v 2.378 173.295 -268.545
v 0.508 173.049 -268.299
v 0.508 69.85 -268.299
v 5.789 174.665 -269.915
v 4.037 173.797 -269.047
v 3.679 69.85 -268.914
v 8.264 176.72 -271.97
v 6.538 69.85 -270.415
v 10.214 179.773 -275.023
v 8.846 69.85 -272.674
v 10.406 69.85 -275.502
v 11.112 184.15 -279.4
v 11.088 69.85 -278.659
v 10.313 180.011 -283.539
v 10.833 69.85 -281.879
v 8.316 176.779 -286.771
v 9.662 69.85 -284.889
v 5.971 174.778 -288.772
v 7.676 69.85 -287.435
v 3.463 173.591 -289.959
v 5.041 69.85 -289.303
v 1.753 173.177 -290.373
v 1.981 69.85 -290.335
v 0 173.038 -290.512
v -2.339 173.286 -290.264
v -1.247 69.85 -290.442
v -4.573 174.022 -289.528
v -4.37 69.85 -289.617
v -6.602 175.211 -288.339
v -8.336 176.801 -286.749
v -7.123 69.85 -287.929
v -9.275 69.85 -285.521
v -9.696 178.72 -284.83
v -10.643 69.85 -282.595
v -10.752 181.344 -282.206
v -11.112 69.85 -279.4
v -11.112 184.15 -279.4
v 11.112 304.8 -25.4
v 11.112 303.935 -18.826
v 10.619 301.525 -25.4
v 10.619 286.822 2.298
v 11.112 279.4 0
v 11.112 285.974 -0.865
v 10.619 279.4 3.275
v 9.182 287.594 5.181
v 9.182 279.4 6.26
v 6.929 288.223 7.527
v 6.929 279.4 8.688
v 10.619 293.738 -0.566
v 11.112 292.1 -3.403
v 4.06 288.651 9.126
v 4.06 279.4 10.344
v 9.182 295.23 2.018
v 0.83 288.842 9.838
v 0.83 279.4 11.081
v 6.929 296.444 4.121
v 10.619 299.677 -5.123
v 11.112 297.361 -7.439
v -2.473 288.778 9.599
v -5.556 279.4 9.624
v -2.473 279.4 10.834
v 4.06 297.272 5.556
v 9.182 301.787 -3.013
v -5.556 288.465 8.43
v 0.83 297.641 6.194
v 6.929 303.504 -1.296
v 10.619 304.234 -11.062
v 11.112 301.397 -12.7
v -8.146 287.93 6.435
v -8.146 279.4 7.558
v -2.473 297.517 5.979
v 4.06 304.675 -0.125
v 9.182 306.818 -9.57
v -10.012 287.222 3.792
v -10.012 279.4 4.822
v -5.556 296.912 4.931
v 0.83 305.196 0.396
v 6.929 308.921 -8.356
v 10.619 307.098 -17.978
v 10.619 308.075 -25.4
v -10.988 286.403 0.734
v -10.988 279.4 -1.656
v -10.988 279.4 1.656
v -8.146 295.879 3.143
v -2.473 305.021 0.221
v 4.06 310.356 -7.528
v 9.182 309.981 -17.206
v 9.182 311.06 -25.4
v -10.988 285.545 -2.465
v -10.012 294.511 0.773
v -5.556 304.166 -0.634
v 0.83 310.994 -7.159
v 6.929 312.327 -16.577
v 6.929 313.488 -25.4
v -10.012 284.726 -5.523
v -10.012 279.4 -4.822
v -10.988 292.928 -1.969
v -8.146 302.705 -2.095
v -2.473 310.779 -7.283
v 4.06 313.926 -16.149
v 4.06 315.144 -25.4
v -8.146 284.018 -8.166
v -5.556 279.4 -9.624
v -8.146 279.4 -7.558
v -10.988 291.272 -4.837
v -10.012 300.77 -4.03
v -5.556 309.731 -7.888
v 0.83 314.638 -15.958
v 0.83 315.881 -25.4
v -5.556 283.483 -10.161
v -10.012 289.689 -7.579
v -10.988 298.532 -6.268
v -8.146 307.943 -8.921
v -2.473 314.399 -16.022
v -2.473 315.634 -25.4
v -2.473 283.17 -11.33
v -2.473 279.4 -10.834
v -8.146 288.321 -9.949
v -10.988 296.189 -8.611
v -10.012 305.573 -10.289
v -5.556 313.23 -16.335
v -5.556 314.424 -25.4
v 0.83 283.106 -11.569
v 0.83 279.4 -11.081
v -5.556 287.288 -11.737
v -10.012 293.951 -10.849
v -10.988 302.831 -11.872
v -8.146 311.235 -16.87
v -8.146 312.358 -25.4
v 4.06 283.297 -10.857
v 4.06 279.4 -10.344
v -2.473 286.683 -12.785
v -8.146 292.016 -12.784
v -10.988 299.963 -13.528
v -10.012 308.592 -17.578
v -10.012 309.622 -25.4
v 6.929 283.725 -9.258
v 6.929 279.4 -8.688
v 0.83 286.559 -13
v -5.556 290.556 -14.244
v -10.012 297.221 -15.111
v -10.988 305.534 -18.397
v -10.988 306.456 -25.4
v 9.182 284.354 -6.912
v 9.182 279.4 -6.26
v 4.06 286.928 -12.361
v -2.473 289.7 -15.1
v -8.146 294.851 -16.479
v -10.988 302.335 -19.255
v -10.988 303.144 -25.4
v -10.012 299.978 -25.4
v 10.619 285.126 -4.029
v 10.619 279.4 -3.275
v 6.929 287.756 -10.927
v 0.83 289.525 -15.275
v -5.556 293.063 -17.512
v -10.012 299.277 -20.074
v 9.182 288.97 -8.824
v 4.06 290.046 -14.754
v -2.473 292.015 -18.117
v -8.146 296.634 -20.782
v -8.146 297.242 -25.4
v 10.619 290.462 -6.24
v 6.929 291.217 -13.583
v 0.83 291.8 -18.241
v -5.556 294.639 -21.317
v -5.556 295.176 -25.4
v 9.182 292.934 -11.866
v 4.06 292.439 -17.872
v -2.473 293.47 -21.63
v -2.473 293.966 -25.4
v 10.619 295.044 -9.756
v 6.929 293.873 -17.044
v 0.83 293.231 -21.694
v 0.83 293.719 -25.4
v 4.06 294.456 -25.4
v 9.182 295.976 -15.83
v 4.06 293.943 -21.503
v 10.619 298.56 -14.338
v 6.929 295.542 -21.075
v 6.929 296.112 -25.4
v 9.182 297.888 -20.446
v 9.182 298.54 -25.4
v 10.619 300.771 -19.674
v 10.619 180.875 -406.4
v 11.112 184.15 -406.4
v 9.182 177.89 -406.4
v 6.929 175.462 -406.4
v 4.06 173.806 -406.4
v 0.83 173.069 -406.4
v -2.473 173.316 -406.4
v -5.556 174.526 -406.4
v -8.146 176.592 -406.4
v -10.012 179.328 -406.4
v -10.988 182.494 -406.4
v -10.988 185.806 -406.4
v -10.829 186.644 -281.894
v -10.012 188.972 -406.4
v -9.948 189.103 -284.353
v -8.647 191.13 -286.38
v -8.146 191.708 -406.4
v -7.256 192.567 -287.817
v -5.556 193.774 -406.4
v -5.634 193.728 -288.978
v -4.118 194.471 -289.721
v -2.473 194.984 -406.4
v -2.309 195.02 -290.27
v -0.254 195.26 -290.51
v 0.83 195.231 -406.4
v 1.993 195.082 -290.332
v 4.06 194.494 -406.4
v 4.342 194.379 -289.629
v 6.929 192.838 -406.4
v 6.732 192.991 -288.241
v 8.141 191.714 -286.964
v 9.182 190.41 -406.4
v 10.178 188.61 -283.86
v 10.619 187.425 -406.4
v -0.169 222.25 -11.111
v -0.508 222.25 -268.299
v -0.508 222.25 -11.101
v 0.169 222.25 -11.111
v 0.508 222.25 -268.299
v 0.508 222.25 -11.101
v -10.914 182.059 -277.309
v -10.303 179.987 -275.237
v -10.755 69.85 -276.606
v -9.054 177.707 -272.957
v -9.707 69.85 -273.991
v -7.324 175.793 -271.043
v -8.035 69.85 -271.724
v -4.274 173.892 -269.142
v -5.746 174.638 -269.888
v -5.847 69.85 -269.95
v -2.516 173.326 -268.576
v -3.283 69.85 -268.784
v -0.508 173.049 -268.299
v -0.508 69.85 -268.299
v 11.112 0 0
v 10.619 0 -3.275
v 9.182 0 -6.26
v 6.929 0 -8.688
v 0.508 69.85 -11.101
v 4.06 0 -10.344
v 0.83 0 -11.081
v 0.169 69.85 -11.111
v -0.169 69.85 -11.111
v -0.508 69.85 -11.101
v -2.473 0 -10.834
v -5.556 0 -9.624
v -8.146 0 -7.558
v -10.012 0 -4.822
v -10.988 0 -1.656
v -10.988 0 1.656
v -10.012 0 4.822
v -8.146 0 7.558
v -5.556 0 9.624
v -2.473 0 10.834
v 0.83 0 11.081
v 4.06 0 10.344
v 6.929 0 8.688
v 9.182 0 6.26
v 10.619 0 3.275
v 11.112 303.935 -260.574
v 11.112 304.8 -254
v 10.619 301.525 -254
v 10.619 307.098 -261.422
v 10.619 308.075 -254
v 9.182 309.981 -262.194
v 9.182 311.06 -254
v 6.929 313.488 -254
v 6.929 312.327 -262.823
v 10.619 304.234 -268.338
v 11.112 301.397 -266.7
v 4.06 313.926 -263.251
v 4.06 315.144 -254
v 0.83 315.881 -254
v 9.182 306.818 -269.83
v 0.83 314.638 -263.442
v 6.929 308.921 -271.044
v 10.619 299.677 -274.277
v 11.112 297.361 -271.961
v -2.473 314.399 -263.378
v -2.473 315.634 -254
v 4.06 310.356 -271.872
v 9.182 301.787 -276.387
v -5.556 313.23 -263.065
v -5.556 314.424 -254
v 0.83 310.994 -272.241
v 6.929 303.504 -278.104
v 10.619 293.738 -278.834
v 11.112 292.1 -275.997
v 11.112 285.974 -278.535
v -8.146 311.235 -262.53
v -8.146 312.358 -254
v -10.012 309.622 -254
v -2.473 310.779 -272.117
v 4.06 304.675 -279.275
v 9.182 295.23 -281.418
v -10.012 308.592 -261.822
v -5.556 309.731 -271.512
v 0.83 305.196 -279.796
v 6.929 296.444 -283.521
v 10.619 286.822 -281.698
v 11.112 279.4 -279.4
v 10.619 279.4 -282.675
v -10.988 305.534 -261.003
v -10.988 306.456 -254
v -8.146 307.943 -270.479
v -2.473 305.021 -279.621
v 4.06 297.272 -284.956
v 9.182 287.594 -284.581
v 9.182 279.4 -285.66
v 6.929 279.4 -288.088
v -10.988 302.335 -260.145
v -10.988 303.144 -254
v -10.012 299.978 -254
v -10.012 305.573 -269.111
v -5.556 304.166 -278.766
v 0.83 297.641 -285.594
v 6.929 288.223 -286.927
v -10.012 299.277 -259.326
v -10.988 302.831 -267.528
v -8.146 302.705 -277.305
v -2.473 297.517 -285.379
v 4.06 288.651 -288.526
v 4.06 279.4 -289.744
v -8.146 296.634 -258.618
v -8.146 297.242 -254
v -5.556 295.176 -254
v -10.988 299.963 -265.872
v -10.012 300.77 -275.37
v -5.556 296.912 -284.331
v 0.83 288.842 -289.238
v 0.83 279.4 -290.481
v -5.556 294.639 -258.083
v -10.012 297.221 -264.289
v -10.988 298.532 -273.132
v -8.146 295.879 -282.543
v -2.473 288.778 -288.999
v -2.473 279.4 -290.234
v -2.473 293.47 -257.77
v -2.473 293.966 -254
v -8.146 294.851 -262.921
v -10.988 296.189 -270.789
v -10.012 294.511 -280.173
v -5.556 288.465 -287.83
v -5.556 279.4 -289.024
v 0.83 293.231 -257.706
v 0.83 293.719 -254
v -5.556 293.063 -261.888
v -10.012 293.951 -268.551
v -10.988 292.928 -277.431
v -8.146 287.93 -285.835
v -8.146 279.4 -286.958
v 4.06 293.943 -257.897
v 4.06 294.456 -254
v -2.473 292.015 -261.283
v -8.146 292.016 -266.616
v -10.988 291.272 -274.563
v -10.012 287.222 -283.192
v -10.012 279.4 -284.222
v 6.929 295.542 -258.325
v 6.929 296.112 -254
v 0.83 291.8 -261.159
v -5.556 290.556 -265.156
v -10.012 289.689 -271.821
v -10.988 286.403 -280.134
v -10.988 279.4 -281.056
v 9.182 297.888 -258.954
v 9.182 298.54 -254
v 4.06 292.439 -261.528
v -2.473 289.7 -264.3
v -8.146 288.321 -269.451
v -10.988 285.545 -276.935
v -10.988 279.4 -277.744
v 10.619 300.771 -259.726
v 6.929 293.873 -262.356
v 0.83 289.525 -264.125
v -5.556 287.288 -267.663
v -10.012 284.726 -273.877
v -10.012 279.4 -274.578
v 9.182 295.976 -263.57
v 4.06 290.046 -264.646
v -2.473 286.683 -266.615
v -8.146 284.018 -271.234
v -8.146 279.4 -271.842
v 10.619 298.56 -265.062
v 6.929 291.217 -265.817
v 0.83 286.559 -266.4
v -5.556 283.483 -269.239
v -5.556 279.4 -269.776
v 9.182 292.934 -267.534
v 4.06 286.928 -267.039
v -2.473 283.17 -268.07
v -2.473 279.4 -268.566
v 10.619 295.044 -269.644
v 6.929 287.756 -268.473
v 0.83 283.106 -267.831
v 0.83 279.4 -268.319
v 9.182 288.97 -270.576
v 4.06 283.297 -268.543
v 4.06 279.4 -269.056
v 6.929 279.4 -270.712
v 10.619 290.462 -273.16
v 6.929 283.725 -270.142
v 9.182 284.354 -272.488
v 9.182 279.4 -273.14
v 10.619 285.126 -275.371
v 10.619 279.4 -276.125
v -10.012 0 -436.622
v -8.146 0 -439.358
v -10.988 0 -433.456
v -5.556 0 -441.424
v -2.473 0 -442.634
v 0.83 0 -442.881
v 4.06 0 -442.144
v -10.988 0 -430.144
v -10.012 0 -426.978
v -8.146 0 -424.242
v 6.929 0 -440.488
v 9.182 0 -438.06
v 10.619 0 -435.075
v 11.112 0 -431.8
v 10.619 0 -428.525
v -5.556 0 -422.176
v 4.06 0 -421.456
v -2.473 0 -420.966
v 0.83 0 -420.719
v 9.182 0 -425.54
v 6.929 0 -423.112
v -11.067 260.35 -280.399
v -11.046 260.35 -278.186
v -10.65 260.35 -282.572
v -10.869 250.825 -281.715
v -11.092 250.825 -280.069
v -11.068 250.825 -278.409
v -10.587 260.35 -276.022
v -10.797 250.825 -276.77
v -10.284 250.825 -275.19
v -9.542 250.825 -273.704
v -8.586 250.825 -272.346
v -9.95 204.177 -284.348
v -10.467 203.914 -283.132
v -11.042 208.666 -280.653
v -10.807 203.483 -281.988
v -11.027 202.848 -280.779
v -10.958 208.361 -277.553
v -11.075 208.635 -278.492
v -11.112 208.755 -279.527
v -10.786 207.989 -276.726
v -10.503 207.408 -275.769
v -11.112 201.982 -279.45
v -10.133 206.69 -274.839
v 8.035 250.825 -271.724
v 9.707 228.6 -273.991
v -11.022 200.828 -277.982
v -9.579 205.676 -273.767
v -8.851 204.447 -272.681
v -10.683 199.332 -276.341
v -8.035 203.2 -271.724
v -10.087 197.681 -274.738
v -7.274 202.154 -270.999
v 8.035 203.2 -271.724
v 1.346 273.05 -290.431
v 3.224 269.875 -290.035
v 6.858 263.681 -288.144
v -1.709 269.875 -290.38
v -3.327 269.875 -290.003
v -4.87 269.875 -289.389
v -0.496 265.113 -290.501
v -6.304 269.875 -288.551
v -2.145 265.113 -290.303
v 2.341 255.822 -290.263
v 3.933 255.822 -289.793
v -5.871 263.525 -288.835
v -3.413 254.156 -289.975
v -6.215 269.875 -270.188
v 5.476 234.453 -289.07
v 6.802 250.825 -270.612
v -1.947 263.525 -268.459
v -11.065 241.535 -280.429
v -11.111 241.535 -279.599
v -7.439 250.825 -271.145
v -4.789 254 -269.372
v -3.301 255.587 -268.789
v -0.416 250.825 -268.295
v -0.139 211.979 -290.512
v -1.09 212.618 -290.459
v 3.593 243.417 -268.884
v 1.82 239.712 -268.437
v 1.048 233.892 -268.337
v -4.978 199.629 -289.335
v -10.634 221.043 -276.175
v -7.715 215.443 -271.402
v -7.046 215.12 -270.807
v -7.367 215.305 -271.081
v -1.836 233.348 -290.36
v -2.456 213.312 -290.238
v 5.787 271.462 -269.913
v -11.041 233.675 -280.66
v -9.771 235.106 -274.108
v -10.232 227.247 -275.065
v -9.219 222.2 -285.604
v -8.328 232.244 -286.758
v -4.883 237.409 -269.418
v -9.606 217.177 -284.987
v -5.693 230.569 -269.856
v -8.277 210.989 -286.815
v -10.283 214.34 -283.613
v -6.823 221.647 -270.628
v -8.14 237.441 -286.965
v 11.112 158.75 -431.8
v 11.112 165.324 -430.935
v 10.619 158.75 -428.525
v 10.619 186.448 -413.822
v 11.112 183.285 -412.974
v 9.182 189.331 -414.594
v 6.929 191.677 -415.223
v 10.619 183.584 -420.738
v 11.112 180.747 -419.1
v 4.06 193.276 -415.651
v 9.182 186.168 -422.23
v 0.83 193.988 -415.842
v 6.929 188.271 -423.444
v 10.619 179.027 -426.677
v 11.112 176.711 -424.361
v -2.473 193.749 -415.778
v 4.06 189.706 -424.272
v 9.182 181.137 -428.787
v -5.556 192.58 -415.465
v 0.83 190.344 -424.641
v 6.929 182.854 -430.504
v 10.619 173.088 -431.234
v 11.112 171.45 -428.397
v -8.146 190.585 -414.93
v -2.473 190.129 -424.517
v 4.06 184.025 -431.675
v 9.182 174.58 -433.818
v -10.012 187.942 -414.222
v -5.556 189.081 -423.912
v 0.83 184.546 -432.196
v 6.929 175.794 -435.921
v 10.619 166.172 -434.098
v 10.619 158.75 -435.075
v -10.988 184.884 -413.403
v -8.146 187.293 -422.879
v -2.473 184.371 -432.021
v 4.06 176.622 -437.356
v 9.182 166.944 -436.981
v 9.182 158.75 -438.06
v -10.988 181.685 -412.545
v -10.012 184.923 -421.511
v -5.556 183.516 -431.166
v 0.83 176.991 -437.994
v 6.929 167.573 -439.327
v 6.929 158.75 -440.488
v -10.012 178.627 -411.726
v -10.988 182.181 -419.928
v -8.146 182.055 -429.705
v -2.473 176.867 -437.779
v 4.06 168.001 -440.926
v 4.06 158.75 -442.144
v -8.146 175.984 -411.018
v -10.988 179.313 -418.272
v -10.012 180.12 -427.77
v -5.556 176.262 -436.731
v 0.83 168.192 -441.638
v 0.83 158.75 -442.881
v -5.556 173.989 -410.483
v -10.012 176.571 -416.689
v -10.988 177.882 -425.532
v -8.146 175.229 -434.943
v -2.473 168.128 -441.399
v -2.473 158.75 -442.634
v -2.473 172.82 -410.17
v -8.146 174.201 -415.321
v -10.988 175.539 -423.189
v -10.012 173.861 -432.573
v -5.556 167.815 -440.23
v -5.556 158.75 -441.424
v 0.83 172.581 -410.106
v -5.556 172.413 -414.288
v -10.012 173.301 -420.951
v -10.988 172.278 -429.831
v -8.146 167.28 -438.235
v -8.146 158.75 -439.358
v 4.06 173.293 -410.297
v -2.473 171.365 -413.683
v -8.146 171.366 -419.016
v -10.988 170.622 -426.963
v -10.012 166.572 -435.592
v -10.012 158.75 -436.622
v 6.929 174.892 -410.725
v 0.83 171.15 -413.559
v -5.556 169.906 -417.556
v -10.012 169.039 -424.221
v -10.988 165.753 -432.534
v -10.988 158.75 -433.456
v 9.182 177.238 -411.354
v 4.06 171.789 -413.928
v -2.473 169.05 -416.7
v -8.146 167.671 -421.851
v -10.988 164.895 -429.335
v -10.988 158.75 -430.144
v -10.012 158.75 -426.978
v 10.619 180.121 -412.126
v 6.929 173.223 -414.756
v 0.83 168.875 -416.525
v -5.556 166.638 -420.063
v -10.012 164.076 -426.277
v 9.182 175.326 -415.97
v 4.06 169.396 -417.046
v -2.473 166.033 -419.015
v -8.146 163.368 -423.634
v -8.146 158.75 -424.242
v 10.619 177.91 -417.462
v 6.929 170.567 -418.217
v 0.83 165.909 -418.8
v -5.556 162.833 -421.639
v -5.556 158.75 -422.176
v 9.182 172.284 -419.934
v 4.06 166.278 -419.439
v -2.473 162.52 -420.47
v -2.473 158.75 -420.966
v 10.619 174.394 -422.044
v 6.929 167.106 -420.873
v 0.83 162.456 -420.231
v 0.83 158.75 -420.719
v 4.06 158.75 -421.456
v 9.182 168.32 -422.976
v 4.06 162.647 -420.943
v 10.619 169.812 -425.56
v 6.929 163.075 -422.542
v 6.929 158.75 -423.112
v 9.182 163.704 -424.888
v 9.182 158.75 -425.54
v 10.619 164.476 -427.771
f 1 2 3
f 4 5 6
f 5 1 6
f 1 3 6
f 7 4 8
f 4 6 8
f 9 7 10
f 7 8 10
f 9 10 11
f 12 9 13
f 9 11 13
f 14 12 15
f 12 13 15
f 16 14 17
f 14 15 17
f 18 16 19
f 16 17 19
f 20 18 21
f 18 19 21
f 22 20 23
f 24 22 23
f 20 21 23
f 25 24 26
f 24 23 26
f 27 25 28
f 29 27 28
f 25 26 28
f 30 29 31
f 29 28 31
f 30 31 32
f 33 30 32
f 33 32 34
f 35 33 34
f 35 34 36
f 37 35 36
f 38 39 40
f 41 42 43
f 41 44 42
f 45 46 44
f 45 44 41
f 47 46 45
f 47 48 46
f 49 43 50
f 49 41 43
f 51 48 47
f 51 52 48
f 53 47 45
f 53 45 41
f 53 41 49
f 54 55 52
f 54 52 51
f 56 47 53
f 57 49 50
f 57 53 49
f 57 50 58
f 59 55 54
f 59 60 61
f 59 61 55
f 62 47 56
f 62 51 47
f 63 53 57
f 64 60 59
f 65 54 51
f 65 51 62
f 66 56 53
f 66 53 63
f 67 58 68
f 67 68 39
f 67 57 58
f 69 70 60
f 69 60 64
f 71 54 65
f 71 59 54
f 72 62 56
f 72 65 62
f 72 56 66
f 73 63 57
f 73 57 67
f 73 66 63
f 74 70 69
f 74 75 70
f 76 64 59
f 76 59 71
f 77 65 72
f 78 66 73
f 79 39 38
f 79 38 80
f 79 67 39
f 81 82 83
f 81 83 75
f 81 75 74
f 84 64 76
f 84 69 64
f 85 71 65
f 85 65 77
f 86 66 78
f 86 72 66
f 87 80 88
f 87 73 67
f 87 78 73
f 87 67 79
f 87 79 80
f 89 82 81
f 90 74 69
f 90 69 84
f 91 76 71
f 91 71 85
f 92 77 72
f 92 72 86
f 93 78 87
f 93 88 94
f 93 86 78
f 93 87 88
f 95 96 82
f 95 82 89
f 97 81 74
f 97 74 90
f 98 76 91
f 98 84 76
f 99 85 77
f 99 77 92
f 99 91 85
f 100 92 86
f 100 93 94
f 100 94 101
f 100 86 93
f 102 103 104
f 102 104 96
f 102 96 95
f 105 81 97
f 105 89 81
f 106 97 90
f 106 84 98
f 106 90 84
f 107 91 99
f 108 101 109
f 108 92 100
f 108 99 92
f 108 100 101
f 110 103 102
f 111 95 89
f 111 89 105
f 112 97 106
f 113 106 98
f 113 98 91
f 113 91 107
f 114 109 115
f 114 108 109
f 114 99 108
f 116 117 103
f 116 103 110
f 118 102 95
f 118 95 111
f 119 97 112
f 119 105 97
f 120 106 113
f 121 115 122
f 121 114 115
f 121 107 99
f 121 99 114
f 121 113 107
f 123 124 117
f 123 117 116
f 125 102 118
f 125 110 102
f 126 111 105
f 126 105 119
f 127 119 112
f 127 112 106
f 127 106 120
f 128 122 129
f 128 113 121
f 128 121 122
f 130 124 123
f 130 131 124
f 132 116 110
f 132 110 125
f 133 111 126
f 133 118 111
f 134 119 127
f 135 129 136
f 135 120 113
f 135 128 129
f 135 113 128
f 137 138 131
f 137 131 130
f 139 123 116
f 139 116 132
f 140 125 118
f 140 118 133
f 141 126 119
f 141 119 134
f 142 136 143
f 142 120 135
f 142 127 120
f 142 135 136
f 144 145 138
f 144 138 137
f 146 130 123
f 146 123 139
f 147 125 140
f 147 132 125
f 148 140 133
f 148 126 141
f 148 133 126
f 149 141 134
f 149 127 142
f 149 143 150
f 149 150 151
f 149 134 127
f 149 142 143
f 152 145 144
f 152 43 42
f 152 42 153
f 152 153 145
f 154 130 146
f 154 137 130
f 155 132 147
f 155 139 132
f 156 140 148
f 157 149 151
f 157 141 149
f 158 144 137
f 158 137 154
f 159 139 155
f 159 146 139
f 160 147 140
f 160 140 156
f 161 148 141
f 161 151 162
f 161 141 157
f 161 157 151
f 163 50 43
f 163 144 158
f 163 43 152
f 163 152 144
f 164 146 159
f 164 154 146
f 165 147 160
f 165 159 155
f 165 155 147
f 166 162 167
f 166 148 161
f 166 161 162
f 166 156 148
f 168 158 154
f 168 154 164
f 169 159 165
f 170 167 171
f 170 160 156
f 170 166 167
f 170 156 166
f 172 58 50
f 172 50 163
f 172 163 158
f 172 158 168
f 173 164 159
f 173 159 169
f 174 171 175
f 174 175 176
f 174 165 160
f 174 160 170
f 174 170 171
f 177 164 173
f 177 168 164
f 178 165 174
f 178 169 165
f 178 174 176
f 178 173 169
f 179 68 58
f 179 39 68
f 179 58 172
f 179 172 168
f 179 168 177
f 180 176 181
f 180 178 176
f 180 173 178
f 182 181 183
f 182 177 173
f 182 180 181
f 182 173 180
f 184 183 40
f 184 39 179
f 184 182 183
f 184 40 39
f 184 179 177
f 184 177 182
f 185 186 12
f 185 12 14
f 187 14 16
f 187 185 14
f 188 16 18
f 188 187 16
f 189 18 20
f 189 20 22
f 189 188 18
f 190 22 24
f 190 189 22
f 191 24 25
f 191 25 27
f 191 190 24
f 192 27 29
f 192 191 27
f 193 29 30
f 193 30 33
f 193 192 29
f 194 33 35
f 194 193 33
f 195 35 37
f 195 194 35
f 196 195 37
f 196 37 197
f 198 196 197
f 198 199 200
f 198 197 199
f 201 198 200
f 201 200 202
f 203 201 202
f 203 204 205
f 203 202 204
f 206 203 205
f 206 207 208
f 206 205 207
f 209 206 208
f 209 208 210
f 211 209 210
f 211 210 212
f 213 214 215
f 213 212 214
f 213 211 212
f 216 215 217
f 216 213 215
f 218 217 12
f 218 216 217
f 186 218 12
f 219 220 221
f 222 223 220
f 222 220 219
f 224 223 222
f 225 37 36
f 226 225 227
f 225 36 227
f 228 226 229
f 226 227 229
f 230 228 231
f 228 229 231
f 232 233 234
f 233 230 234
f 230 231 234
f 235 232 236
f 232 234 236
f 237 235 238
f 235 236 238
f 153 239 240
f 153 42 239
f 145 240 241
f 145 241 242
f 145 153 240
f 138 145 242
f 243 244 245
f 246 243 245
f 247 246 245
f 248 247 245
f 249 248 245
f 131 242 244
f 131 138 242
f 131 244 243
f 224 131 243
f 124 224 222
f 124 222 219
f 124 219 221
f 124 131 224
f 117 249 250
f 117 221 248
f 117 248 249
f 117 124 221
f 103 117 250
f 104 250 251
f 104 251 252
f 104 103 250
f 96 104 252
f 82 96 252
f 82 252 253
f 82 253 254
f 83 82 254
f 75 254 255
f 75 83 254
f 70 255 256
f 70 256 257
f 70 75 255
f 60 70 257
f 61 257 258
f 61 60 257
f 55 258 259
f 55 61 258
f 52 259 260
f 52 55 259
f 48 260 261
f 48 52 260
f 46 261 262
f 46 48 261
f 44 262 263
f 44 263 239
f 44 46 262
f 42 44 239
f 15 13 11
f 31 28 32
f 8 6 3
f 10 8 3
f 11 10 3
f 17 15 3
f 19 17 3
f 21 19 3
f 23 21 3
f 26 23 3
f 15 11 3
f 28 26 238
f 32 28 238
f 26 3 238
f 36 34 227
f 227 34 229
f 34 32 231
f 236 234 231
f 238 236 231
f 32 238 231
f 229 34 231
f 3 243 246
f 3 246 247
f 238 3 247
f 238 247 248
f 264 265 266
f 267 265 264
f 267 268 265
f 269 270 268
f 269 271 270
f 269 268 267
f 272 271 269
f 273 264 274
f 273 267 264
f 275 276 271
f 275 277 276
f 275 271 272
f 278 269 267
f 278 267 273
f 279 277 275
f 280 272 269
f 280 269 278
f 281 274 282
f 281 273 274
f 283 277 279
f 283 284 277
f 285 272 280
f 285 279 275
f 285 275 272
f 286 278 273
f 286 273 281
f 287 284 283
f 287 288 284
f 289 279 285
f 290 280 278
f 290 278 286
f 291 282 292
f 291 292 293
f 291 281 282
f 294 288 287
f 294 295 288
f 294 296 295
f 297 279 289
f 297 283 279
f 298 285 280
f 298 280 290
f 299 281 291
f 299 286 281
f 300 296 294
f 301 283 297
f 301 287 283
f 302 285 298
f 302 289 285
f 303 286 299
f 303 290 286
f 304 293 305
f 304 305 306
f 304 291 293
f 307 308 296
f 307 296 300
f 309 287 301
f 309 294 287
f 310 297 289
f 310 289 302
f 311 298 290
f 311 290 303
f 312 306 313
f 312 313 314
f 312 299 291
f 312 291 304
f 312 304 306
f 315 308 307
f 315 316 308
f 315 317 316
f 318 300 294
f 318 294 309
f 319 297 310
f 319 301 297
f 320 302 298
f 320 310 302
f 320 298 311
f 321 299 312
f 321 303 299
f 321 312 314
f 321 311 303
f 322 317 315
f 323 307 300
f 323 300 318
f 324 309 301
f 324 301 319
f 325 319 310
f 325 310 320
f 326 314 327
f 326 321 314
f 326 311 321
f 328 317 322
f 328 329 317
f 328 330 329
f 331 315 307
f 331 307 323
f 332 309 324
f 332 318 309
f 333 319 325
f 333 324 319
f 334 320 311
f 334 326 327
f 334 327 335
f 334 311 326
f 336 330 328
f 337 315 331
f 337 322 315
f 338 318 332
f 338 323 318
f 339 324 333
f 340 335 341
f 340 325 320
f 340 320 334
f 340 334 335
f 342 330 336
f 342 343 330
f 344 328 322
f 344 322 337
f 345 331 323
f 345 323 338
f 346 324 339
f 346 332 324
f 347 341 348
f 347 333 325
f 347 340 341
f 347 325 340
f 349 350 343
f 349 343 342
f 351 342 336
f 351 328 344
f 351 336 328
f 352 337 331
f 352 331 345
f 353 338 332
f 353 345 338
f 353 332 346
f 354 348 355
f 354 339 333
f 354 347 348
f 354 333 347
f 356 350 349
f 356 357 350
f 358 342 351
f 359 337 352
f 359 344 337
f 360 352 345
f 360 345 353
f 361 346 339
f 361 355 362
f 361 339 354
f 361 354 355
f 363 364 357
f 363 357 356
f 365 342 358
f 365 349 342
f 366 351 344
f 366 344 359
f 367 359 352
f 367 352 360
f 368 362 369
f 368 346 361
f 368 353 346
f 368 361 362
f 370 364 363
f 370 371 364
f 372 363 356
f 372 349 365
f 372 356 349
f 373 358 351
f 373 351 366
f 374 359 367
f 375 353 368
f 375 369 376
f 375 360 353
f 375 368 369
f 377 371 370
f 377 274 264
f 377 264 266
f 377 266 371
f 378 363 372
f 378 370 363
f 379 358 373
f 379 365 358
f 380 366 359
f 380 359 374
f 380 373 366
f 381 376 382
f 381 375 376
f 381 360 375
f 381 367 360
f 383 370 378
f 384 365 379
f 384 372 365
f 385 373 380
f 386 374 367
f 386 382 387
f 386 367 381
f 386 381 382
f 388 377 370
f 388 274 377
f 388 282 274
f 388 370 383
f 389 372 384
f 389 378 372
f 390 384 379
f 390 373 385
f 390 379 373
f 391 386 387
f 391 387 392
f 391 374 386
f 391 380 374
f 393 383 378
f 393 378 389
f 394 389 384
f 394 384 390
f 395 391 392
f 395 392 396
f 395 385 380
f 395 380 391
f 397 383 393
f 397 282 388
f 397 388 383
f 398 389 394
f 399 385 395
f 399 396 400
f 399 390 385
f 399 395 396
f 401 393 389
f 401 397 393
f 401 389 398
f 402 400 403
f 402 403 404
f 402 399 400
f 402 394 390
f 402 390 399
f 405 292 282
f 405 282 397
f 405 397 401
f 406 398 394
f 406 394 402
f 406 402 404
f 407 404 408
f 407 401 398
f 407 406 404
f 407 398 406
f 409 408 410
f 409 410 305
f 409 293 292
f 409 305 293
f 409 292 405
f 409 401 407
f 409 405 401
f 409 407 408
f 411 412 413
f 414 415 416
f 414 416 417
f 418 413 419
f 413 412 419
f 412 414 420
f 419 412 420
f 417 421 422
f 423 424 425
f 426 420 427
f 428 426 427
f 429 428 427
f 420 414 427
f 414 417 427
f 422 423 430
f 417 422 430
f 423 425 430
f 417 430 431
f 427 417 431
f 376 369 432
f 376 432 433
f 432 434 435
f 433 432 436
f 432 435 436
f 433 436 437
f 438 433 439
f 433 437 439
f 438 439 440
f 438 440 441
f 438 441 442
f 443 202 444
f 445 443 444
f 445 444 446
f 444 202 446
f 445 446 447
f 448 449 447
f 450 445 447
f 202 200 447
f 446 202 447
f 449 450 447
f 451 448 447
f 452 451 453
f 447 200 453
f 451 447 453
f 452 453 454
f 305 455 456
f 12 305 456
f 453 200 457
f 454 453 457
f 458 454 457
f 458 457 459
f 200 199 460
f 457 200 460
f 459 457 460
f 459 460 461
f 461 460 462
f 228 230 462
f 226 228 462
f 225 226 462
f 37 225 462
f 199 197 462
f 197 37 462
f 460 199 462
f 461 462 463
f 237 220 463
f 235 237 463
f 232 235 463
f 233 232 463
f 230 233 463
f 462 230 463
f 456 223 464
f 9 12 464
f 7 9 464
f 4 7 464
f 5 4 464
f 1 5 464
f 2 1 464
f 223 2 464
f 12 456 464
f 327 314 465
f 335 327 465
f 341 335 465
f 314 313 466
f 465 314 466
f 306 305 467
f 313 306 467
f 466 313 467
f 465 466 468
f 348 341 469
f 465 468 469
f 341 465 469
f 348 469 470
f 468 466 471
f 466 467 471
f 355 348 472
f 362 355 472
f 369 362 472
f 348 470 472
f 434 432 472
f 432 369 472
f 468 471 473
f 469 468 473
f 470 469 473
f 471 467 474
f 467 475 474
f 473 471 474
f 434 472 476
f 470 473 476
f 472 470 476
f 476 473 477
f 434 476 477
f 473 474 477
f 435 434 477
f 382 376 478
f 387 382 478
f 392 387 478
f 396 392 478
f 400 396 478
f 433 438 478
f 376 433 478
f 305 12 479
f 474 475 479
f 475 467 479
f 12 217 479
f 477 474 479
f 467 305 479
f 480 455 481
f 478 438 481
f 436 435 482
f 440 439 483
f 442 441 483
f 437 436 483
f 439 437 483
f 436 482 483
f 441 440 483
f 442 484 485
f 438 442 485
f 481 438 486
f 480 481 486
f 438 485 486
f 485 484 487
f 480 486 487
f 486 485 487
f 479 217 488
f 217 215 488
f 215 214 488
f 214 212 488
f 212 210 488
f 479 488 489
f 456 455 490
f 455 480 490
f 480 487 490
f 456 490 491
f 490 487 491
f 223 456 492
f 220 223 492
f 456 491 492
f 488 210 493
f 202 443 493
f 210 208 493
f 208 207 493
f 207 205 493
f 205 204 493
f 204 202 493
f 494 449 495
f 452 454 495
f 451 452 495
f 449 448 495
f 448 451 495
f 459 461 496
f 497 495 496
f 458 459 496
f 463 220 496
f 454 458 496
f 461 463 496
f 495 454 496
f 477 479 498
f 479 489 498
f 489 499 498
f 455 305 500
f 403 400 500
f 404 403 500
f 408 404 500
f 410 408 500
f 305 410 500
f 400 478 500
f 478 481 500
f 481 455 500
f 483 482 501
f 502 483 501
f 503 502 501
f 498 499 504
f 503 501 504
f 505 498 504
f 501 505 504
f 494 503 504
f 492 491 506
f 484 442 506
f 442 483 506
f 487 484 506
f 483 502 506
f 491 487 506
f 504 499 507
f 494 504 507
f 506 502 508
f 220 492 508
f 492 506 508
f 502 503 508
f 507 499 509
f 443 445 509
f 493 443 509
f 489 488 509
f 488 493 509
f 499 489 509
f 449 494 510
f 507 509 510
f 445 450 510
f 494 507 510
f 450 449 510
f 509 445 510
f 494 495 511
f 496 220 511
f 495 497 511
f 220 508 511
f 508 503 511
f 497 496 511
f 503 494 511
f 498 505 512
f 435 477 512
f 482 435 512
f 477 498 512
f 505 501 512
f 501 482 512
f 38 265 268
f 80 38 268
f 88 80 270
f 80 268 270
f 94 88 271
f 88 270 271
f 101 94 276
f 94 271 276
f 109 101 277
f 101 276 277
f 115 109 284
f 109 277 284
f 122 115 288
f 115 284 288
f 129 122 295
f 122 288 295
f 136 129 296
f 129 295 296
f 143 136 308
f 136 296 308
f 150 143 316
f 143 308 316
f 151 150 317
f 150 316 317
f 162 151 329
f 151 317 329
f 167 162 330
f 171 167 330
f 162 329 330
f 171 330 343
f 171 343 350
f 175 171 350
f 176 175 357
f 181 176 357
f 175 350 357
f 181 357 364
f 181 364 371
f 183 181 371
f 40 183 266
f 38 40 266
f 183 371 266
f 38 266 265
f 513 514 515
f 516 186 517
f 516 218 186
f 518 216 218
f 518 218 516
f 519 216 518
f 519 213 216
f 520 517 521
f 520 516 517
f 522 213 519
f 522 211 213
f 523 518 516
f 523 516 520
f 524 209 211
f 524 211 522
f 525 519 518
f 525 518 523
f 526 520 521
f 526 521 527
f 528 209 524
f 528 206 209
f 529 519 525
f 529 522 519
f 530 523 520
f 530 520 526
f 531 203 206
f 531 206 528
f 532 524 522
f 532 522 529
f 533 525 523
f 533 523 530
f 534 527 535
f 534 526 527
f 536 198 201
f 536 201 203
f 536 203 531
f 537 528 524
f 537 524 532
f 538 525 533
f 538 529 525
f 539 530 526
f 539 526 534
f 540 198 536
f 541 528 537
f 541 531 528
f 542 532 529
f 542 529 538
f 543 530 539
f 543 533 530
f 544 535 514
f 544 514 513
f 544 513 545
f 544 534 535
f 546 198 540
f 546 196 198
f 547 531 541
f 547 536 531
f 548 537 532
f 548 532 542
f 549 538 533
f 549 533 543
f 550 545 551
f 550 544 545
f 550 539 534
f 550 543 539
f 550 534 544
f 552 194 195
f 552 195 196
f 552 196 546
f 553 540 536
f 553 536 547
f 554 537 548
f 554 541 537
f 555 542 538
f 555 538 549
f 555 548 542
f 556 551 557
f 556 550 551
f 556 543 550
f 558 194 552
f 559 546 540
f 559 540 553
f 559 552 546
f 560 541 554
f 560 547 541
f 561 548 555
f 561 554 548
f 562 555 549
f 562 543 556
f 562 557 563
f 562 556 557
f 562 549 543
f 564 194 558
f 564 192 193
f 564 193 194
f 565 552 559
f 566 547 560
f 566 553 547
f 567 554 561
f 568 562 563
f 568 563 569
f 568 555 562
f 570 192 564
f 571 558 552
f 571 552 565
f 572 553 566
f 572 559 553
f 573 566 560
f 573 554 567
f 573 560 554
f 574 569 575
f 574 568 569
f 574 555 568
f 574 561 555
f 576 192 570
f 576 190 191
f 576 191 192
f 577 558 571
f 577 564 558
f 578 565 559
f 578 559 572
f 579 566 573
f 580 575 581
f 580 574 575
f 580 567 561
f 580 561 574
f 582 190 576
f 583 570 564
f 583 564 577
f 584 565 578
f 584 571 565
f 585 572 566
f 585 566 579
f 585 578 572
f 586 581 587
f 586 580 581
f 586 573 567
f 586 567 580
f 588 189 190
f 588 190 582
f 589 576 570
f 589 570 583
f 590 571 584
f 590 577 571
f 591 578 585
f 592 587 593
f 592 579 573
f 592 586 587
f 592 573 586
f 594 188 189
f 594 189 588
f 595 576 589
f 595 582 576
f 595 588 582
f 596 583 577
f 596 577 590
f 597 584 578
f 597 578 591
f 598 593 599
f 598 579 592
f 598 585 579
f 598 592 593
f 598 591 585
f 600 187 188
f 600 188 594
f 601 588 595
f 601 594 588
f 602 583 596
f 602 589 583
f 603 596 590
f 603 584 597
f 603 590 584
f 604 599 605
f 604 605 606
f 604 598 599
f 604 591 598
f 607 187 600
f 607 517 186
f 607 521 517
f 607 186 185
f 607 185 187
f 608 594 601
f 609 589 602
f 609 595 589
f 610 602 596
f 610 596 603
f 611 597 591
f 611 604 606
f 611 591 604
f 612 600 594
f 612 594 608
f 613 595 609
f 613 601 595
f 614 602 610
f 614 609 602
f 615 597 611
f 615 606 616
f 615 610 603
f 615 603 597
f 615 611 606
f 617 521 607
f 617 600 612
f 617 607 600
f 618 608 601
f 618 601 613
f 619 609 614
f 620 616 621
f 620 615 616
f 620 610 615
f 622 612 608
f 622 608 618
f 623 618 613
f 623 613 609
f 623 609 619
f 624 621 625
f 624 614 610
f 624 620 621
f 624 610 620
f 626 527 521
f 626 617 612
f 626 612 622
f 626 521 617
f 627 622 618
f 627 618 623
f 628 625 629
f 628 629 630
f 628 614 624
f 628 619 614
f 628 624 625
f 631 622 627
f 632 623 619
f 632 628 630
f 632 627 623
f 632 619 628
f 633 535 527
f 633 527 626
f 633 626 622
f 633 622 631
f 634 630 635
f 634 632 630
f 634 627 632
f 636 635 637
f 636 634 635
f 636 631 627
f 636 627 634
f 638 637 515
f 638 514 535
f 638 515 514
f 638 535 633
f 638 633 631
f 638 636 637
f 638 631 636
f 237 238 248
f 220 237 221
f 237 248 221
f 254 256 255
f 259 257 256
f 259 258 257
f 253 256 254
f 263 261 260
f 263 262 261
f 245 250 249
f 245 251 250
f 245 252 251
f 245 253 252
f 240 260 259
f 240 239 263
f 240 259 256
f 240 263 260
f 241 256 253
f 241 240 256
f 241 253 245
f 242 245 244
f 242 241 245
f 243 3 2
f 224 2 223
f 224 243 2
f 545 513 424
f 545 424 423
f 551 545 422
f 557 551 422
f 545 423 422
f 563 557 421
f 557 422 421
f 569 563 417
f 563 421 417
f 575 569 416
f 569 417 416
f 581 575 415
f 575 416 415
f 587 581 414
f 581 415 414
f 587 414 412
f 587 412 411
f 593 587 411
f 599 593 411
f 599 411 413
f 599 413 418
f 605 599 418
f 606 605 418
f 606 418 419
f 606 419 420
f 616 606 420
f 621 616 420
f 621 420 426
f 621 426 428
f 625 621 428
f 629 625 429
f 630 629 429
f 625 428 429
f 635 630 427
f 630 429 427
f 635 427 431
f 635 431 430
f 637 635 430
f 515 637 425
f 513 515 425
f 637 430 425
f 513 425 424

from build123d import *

# Parameters (mm, degrees)
SKETCH_R     = 11.1125
SKETCH003_R  = 11.1125
PAD_DEPTH    = 137
SKETCH004_W  = 152.4
SKETCH004_H  = 270.212156
PAD001_DEPTH = 0.508


with BuildPart() as part:
    # AdditivePipe: sweep along a path in Sketch001
    with BuildLine(Plane.YZ) as additivepipe_path:
        Line((0, 0), (279.4, 0))
        ThreePointArc((279.4, 0), (297.360512, -7.439488), (304.8, -25.4))
        Line((304.8, -25.4), (304.8, -254))
        ThreePointArc((304.8, -254), (297.360512, -271.960512), (279.4, -279.4))
        Line((279.4, -279.4), (184.15, -279.4))
        Line((184.15, -279.4), (184.15, -406.4))
        ThreePointArc((184.15, -406.4), (176.710512, -424.360512), (158.75, -431.8))
        Line((158.75, -431.8), (0, -431.8))
    # Sketch → AdditivePipe (sweep)
    with BuildSketch(Plane.XZ):
        Circle(SKETCH_R)
    sweep(path=additivepipe_path.line, transition=Transition.RIGHT)

    # Sketch003 (on DatumPlane) → Pad (new body)
    with BuildSketch(Plane(origin=(0, 69.85, -279.4), x_dir=(-1, 0, 0), z_dir=(0, 1, 0))):
        Circle(SKETCH003_R)
    extrude(amount=PAD_DEPTH)

    # Sketch004 → Pad001 (join, symmetric)
    with BuildSketch(Plane.YZ):
        with Locations((146.05, -138.737672)):
            Rectangle(SKETCH004_W, SKETCH004_H)
    extrude(amount=PAD001_DEPTH, both=True)


solid = part.part
